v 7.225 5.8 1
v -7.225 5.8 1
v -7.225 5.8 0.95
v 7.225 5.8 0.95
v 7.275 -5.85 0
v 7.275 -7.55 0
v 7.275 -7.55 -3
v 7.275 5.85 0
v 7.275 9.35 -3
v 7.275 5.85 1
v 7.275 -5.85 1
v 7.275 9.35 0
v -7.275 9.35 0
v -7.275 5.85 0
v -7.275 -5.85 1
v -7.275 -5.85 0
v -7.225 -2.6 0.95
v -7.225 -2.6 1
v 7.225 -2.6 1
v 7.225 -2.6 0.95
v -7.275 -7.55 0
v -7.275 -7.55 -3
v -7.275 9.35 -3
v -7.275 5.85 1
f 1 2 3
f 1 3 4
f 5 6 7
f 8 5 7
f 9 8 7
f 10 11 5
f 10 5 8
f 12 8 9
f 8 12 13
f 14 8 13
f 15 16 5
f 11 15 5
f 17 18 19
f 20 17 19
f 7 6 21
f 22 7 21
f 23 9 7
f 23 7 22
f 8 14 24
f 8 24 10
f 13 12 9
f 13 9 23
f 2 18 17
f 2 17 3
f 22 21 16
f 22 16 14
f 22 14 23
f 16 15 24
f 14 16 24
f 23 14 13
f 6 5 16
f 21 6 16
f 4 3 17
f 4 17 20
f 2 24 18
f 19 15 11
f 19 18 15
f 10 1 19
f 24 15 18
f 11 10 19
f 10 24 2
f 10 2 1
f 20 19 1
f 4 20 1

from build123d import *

# Parameters (mm, degrees)
SKETCH_1_W          = 14.55
SKETCH_1_H          = 11.7
EXTRUDE_1_DEPTH     = 1
SKETCH_2_W          = 14.45
SKETCH_2_H          = 8.4
CUT_EXTRUDE_1_DEPTH = 0.05
SKETCH_3_W          = 14.55
SKETCH_3_H          = 16.9
EXTRUDE_2_DEPTH     = 3


with BuildPart() as part:
    # Эскиз1 → Бобышка-Вытянуть1 (new body)
    with BuildSketch(Plane.XY):
        Rectangle(SKETCH_1_W, SKETCH_1_H)
    extrude(amount=EXTRUDE_1_DEPTH)

    # Эскиз2 → Вырез-Вытянуть1 (cut)
    with BuildSketch(Plane.XY.offset(1)):
        with Locations((0, 1.6)):
            Rectangle(SKETCH_2_W, SKETCH_2_H)
    extrude(amount=-CUT_EXTRUDE_1_DEPTH, mode=Mode.SUBTRACT)

    # Эскиз3 → Бобышка-Вытянуть2 (add)
    with BuildSketch(Plane(origin=(0, 0, 0), x_dir=(-1, 0, 0), z_dir=(0, 0, -1))):
        with Locations((0, 0.9)):
            Rectangle(SKETCH_3_W, SKETCH_3_H)
    extrude(amount=EXTRUDE_2_DEPTH)


solid = part.part
